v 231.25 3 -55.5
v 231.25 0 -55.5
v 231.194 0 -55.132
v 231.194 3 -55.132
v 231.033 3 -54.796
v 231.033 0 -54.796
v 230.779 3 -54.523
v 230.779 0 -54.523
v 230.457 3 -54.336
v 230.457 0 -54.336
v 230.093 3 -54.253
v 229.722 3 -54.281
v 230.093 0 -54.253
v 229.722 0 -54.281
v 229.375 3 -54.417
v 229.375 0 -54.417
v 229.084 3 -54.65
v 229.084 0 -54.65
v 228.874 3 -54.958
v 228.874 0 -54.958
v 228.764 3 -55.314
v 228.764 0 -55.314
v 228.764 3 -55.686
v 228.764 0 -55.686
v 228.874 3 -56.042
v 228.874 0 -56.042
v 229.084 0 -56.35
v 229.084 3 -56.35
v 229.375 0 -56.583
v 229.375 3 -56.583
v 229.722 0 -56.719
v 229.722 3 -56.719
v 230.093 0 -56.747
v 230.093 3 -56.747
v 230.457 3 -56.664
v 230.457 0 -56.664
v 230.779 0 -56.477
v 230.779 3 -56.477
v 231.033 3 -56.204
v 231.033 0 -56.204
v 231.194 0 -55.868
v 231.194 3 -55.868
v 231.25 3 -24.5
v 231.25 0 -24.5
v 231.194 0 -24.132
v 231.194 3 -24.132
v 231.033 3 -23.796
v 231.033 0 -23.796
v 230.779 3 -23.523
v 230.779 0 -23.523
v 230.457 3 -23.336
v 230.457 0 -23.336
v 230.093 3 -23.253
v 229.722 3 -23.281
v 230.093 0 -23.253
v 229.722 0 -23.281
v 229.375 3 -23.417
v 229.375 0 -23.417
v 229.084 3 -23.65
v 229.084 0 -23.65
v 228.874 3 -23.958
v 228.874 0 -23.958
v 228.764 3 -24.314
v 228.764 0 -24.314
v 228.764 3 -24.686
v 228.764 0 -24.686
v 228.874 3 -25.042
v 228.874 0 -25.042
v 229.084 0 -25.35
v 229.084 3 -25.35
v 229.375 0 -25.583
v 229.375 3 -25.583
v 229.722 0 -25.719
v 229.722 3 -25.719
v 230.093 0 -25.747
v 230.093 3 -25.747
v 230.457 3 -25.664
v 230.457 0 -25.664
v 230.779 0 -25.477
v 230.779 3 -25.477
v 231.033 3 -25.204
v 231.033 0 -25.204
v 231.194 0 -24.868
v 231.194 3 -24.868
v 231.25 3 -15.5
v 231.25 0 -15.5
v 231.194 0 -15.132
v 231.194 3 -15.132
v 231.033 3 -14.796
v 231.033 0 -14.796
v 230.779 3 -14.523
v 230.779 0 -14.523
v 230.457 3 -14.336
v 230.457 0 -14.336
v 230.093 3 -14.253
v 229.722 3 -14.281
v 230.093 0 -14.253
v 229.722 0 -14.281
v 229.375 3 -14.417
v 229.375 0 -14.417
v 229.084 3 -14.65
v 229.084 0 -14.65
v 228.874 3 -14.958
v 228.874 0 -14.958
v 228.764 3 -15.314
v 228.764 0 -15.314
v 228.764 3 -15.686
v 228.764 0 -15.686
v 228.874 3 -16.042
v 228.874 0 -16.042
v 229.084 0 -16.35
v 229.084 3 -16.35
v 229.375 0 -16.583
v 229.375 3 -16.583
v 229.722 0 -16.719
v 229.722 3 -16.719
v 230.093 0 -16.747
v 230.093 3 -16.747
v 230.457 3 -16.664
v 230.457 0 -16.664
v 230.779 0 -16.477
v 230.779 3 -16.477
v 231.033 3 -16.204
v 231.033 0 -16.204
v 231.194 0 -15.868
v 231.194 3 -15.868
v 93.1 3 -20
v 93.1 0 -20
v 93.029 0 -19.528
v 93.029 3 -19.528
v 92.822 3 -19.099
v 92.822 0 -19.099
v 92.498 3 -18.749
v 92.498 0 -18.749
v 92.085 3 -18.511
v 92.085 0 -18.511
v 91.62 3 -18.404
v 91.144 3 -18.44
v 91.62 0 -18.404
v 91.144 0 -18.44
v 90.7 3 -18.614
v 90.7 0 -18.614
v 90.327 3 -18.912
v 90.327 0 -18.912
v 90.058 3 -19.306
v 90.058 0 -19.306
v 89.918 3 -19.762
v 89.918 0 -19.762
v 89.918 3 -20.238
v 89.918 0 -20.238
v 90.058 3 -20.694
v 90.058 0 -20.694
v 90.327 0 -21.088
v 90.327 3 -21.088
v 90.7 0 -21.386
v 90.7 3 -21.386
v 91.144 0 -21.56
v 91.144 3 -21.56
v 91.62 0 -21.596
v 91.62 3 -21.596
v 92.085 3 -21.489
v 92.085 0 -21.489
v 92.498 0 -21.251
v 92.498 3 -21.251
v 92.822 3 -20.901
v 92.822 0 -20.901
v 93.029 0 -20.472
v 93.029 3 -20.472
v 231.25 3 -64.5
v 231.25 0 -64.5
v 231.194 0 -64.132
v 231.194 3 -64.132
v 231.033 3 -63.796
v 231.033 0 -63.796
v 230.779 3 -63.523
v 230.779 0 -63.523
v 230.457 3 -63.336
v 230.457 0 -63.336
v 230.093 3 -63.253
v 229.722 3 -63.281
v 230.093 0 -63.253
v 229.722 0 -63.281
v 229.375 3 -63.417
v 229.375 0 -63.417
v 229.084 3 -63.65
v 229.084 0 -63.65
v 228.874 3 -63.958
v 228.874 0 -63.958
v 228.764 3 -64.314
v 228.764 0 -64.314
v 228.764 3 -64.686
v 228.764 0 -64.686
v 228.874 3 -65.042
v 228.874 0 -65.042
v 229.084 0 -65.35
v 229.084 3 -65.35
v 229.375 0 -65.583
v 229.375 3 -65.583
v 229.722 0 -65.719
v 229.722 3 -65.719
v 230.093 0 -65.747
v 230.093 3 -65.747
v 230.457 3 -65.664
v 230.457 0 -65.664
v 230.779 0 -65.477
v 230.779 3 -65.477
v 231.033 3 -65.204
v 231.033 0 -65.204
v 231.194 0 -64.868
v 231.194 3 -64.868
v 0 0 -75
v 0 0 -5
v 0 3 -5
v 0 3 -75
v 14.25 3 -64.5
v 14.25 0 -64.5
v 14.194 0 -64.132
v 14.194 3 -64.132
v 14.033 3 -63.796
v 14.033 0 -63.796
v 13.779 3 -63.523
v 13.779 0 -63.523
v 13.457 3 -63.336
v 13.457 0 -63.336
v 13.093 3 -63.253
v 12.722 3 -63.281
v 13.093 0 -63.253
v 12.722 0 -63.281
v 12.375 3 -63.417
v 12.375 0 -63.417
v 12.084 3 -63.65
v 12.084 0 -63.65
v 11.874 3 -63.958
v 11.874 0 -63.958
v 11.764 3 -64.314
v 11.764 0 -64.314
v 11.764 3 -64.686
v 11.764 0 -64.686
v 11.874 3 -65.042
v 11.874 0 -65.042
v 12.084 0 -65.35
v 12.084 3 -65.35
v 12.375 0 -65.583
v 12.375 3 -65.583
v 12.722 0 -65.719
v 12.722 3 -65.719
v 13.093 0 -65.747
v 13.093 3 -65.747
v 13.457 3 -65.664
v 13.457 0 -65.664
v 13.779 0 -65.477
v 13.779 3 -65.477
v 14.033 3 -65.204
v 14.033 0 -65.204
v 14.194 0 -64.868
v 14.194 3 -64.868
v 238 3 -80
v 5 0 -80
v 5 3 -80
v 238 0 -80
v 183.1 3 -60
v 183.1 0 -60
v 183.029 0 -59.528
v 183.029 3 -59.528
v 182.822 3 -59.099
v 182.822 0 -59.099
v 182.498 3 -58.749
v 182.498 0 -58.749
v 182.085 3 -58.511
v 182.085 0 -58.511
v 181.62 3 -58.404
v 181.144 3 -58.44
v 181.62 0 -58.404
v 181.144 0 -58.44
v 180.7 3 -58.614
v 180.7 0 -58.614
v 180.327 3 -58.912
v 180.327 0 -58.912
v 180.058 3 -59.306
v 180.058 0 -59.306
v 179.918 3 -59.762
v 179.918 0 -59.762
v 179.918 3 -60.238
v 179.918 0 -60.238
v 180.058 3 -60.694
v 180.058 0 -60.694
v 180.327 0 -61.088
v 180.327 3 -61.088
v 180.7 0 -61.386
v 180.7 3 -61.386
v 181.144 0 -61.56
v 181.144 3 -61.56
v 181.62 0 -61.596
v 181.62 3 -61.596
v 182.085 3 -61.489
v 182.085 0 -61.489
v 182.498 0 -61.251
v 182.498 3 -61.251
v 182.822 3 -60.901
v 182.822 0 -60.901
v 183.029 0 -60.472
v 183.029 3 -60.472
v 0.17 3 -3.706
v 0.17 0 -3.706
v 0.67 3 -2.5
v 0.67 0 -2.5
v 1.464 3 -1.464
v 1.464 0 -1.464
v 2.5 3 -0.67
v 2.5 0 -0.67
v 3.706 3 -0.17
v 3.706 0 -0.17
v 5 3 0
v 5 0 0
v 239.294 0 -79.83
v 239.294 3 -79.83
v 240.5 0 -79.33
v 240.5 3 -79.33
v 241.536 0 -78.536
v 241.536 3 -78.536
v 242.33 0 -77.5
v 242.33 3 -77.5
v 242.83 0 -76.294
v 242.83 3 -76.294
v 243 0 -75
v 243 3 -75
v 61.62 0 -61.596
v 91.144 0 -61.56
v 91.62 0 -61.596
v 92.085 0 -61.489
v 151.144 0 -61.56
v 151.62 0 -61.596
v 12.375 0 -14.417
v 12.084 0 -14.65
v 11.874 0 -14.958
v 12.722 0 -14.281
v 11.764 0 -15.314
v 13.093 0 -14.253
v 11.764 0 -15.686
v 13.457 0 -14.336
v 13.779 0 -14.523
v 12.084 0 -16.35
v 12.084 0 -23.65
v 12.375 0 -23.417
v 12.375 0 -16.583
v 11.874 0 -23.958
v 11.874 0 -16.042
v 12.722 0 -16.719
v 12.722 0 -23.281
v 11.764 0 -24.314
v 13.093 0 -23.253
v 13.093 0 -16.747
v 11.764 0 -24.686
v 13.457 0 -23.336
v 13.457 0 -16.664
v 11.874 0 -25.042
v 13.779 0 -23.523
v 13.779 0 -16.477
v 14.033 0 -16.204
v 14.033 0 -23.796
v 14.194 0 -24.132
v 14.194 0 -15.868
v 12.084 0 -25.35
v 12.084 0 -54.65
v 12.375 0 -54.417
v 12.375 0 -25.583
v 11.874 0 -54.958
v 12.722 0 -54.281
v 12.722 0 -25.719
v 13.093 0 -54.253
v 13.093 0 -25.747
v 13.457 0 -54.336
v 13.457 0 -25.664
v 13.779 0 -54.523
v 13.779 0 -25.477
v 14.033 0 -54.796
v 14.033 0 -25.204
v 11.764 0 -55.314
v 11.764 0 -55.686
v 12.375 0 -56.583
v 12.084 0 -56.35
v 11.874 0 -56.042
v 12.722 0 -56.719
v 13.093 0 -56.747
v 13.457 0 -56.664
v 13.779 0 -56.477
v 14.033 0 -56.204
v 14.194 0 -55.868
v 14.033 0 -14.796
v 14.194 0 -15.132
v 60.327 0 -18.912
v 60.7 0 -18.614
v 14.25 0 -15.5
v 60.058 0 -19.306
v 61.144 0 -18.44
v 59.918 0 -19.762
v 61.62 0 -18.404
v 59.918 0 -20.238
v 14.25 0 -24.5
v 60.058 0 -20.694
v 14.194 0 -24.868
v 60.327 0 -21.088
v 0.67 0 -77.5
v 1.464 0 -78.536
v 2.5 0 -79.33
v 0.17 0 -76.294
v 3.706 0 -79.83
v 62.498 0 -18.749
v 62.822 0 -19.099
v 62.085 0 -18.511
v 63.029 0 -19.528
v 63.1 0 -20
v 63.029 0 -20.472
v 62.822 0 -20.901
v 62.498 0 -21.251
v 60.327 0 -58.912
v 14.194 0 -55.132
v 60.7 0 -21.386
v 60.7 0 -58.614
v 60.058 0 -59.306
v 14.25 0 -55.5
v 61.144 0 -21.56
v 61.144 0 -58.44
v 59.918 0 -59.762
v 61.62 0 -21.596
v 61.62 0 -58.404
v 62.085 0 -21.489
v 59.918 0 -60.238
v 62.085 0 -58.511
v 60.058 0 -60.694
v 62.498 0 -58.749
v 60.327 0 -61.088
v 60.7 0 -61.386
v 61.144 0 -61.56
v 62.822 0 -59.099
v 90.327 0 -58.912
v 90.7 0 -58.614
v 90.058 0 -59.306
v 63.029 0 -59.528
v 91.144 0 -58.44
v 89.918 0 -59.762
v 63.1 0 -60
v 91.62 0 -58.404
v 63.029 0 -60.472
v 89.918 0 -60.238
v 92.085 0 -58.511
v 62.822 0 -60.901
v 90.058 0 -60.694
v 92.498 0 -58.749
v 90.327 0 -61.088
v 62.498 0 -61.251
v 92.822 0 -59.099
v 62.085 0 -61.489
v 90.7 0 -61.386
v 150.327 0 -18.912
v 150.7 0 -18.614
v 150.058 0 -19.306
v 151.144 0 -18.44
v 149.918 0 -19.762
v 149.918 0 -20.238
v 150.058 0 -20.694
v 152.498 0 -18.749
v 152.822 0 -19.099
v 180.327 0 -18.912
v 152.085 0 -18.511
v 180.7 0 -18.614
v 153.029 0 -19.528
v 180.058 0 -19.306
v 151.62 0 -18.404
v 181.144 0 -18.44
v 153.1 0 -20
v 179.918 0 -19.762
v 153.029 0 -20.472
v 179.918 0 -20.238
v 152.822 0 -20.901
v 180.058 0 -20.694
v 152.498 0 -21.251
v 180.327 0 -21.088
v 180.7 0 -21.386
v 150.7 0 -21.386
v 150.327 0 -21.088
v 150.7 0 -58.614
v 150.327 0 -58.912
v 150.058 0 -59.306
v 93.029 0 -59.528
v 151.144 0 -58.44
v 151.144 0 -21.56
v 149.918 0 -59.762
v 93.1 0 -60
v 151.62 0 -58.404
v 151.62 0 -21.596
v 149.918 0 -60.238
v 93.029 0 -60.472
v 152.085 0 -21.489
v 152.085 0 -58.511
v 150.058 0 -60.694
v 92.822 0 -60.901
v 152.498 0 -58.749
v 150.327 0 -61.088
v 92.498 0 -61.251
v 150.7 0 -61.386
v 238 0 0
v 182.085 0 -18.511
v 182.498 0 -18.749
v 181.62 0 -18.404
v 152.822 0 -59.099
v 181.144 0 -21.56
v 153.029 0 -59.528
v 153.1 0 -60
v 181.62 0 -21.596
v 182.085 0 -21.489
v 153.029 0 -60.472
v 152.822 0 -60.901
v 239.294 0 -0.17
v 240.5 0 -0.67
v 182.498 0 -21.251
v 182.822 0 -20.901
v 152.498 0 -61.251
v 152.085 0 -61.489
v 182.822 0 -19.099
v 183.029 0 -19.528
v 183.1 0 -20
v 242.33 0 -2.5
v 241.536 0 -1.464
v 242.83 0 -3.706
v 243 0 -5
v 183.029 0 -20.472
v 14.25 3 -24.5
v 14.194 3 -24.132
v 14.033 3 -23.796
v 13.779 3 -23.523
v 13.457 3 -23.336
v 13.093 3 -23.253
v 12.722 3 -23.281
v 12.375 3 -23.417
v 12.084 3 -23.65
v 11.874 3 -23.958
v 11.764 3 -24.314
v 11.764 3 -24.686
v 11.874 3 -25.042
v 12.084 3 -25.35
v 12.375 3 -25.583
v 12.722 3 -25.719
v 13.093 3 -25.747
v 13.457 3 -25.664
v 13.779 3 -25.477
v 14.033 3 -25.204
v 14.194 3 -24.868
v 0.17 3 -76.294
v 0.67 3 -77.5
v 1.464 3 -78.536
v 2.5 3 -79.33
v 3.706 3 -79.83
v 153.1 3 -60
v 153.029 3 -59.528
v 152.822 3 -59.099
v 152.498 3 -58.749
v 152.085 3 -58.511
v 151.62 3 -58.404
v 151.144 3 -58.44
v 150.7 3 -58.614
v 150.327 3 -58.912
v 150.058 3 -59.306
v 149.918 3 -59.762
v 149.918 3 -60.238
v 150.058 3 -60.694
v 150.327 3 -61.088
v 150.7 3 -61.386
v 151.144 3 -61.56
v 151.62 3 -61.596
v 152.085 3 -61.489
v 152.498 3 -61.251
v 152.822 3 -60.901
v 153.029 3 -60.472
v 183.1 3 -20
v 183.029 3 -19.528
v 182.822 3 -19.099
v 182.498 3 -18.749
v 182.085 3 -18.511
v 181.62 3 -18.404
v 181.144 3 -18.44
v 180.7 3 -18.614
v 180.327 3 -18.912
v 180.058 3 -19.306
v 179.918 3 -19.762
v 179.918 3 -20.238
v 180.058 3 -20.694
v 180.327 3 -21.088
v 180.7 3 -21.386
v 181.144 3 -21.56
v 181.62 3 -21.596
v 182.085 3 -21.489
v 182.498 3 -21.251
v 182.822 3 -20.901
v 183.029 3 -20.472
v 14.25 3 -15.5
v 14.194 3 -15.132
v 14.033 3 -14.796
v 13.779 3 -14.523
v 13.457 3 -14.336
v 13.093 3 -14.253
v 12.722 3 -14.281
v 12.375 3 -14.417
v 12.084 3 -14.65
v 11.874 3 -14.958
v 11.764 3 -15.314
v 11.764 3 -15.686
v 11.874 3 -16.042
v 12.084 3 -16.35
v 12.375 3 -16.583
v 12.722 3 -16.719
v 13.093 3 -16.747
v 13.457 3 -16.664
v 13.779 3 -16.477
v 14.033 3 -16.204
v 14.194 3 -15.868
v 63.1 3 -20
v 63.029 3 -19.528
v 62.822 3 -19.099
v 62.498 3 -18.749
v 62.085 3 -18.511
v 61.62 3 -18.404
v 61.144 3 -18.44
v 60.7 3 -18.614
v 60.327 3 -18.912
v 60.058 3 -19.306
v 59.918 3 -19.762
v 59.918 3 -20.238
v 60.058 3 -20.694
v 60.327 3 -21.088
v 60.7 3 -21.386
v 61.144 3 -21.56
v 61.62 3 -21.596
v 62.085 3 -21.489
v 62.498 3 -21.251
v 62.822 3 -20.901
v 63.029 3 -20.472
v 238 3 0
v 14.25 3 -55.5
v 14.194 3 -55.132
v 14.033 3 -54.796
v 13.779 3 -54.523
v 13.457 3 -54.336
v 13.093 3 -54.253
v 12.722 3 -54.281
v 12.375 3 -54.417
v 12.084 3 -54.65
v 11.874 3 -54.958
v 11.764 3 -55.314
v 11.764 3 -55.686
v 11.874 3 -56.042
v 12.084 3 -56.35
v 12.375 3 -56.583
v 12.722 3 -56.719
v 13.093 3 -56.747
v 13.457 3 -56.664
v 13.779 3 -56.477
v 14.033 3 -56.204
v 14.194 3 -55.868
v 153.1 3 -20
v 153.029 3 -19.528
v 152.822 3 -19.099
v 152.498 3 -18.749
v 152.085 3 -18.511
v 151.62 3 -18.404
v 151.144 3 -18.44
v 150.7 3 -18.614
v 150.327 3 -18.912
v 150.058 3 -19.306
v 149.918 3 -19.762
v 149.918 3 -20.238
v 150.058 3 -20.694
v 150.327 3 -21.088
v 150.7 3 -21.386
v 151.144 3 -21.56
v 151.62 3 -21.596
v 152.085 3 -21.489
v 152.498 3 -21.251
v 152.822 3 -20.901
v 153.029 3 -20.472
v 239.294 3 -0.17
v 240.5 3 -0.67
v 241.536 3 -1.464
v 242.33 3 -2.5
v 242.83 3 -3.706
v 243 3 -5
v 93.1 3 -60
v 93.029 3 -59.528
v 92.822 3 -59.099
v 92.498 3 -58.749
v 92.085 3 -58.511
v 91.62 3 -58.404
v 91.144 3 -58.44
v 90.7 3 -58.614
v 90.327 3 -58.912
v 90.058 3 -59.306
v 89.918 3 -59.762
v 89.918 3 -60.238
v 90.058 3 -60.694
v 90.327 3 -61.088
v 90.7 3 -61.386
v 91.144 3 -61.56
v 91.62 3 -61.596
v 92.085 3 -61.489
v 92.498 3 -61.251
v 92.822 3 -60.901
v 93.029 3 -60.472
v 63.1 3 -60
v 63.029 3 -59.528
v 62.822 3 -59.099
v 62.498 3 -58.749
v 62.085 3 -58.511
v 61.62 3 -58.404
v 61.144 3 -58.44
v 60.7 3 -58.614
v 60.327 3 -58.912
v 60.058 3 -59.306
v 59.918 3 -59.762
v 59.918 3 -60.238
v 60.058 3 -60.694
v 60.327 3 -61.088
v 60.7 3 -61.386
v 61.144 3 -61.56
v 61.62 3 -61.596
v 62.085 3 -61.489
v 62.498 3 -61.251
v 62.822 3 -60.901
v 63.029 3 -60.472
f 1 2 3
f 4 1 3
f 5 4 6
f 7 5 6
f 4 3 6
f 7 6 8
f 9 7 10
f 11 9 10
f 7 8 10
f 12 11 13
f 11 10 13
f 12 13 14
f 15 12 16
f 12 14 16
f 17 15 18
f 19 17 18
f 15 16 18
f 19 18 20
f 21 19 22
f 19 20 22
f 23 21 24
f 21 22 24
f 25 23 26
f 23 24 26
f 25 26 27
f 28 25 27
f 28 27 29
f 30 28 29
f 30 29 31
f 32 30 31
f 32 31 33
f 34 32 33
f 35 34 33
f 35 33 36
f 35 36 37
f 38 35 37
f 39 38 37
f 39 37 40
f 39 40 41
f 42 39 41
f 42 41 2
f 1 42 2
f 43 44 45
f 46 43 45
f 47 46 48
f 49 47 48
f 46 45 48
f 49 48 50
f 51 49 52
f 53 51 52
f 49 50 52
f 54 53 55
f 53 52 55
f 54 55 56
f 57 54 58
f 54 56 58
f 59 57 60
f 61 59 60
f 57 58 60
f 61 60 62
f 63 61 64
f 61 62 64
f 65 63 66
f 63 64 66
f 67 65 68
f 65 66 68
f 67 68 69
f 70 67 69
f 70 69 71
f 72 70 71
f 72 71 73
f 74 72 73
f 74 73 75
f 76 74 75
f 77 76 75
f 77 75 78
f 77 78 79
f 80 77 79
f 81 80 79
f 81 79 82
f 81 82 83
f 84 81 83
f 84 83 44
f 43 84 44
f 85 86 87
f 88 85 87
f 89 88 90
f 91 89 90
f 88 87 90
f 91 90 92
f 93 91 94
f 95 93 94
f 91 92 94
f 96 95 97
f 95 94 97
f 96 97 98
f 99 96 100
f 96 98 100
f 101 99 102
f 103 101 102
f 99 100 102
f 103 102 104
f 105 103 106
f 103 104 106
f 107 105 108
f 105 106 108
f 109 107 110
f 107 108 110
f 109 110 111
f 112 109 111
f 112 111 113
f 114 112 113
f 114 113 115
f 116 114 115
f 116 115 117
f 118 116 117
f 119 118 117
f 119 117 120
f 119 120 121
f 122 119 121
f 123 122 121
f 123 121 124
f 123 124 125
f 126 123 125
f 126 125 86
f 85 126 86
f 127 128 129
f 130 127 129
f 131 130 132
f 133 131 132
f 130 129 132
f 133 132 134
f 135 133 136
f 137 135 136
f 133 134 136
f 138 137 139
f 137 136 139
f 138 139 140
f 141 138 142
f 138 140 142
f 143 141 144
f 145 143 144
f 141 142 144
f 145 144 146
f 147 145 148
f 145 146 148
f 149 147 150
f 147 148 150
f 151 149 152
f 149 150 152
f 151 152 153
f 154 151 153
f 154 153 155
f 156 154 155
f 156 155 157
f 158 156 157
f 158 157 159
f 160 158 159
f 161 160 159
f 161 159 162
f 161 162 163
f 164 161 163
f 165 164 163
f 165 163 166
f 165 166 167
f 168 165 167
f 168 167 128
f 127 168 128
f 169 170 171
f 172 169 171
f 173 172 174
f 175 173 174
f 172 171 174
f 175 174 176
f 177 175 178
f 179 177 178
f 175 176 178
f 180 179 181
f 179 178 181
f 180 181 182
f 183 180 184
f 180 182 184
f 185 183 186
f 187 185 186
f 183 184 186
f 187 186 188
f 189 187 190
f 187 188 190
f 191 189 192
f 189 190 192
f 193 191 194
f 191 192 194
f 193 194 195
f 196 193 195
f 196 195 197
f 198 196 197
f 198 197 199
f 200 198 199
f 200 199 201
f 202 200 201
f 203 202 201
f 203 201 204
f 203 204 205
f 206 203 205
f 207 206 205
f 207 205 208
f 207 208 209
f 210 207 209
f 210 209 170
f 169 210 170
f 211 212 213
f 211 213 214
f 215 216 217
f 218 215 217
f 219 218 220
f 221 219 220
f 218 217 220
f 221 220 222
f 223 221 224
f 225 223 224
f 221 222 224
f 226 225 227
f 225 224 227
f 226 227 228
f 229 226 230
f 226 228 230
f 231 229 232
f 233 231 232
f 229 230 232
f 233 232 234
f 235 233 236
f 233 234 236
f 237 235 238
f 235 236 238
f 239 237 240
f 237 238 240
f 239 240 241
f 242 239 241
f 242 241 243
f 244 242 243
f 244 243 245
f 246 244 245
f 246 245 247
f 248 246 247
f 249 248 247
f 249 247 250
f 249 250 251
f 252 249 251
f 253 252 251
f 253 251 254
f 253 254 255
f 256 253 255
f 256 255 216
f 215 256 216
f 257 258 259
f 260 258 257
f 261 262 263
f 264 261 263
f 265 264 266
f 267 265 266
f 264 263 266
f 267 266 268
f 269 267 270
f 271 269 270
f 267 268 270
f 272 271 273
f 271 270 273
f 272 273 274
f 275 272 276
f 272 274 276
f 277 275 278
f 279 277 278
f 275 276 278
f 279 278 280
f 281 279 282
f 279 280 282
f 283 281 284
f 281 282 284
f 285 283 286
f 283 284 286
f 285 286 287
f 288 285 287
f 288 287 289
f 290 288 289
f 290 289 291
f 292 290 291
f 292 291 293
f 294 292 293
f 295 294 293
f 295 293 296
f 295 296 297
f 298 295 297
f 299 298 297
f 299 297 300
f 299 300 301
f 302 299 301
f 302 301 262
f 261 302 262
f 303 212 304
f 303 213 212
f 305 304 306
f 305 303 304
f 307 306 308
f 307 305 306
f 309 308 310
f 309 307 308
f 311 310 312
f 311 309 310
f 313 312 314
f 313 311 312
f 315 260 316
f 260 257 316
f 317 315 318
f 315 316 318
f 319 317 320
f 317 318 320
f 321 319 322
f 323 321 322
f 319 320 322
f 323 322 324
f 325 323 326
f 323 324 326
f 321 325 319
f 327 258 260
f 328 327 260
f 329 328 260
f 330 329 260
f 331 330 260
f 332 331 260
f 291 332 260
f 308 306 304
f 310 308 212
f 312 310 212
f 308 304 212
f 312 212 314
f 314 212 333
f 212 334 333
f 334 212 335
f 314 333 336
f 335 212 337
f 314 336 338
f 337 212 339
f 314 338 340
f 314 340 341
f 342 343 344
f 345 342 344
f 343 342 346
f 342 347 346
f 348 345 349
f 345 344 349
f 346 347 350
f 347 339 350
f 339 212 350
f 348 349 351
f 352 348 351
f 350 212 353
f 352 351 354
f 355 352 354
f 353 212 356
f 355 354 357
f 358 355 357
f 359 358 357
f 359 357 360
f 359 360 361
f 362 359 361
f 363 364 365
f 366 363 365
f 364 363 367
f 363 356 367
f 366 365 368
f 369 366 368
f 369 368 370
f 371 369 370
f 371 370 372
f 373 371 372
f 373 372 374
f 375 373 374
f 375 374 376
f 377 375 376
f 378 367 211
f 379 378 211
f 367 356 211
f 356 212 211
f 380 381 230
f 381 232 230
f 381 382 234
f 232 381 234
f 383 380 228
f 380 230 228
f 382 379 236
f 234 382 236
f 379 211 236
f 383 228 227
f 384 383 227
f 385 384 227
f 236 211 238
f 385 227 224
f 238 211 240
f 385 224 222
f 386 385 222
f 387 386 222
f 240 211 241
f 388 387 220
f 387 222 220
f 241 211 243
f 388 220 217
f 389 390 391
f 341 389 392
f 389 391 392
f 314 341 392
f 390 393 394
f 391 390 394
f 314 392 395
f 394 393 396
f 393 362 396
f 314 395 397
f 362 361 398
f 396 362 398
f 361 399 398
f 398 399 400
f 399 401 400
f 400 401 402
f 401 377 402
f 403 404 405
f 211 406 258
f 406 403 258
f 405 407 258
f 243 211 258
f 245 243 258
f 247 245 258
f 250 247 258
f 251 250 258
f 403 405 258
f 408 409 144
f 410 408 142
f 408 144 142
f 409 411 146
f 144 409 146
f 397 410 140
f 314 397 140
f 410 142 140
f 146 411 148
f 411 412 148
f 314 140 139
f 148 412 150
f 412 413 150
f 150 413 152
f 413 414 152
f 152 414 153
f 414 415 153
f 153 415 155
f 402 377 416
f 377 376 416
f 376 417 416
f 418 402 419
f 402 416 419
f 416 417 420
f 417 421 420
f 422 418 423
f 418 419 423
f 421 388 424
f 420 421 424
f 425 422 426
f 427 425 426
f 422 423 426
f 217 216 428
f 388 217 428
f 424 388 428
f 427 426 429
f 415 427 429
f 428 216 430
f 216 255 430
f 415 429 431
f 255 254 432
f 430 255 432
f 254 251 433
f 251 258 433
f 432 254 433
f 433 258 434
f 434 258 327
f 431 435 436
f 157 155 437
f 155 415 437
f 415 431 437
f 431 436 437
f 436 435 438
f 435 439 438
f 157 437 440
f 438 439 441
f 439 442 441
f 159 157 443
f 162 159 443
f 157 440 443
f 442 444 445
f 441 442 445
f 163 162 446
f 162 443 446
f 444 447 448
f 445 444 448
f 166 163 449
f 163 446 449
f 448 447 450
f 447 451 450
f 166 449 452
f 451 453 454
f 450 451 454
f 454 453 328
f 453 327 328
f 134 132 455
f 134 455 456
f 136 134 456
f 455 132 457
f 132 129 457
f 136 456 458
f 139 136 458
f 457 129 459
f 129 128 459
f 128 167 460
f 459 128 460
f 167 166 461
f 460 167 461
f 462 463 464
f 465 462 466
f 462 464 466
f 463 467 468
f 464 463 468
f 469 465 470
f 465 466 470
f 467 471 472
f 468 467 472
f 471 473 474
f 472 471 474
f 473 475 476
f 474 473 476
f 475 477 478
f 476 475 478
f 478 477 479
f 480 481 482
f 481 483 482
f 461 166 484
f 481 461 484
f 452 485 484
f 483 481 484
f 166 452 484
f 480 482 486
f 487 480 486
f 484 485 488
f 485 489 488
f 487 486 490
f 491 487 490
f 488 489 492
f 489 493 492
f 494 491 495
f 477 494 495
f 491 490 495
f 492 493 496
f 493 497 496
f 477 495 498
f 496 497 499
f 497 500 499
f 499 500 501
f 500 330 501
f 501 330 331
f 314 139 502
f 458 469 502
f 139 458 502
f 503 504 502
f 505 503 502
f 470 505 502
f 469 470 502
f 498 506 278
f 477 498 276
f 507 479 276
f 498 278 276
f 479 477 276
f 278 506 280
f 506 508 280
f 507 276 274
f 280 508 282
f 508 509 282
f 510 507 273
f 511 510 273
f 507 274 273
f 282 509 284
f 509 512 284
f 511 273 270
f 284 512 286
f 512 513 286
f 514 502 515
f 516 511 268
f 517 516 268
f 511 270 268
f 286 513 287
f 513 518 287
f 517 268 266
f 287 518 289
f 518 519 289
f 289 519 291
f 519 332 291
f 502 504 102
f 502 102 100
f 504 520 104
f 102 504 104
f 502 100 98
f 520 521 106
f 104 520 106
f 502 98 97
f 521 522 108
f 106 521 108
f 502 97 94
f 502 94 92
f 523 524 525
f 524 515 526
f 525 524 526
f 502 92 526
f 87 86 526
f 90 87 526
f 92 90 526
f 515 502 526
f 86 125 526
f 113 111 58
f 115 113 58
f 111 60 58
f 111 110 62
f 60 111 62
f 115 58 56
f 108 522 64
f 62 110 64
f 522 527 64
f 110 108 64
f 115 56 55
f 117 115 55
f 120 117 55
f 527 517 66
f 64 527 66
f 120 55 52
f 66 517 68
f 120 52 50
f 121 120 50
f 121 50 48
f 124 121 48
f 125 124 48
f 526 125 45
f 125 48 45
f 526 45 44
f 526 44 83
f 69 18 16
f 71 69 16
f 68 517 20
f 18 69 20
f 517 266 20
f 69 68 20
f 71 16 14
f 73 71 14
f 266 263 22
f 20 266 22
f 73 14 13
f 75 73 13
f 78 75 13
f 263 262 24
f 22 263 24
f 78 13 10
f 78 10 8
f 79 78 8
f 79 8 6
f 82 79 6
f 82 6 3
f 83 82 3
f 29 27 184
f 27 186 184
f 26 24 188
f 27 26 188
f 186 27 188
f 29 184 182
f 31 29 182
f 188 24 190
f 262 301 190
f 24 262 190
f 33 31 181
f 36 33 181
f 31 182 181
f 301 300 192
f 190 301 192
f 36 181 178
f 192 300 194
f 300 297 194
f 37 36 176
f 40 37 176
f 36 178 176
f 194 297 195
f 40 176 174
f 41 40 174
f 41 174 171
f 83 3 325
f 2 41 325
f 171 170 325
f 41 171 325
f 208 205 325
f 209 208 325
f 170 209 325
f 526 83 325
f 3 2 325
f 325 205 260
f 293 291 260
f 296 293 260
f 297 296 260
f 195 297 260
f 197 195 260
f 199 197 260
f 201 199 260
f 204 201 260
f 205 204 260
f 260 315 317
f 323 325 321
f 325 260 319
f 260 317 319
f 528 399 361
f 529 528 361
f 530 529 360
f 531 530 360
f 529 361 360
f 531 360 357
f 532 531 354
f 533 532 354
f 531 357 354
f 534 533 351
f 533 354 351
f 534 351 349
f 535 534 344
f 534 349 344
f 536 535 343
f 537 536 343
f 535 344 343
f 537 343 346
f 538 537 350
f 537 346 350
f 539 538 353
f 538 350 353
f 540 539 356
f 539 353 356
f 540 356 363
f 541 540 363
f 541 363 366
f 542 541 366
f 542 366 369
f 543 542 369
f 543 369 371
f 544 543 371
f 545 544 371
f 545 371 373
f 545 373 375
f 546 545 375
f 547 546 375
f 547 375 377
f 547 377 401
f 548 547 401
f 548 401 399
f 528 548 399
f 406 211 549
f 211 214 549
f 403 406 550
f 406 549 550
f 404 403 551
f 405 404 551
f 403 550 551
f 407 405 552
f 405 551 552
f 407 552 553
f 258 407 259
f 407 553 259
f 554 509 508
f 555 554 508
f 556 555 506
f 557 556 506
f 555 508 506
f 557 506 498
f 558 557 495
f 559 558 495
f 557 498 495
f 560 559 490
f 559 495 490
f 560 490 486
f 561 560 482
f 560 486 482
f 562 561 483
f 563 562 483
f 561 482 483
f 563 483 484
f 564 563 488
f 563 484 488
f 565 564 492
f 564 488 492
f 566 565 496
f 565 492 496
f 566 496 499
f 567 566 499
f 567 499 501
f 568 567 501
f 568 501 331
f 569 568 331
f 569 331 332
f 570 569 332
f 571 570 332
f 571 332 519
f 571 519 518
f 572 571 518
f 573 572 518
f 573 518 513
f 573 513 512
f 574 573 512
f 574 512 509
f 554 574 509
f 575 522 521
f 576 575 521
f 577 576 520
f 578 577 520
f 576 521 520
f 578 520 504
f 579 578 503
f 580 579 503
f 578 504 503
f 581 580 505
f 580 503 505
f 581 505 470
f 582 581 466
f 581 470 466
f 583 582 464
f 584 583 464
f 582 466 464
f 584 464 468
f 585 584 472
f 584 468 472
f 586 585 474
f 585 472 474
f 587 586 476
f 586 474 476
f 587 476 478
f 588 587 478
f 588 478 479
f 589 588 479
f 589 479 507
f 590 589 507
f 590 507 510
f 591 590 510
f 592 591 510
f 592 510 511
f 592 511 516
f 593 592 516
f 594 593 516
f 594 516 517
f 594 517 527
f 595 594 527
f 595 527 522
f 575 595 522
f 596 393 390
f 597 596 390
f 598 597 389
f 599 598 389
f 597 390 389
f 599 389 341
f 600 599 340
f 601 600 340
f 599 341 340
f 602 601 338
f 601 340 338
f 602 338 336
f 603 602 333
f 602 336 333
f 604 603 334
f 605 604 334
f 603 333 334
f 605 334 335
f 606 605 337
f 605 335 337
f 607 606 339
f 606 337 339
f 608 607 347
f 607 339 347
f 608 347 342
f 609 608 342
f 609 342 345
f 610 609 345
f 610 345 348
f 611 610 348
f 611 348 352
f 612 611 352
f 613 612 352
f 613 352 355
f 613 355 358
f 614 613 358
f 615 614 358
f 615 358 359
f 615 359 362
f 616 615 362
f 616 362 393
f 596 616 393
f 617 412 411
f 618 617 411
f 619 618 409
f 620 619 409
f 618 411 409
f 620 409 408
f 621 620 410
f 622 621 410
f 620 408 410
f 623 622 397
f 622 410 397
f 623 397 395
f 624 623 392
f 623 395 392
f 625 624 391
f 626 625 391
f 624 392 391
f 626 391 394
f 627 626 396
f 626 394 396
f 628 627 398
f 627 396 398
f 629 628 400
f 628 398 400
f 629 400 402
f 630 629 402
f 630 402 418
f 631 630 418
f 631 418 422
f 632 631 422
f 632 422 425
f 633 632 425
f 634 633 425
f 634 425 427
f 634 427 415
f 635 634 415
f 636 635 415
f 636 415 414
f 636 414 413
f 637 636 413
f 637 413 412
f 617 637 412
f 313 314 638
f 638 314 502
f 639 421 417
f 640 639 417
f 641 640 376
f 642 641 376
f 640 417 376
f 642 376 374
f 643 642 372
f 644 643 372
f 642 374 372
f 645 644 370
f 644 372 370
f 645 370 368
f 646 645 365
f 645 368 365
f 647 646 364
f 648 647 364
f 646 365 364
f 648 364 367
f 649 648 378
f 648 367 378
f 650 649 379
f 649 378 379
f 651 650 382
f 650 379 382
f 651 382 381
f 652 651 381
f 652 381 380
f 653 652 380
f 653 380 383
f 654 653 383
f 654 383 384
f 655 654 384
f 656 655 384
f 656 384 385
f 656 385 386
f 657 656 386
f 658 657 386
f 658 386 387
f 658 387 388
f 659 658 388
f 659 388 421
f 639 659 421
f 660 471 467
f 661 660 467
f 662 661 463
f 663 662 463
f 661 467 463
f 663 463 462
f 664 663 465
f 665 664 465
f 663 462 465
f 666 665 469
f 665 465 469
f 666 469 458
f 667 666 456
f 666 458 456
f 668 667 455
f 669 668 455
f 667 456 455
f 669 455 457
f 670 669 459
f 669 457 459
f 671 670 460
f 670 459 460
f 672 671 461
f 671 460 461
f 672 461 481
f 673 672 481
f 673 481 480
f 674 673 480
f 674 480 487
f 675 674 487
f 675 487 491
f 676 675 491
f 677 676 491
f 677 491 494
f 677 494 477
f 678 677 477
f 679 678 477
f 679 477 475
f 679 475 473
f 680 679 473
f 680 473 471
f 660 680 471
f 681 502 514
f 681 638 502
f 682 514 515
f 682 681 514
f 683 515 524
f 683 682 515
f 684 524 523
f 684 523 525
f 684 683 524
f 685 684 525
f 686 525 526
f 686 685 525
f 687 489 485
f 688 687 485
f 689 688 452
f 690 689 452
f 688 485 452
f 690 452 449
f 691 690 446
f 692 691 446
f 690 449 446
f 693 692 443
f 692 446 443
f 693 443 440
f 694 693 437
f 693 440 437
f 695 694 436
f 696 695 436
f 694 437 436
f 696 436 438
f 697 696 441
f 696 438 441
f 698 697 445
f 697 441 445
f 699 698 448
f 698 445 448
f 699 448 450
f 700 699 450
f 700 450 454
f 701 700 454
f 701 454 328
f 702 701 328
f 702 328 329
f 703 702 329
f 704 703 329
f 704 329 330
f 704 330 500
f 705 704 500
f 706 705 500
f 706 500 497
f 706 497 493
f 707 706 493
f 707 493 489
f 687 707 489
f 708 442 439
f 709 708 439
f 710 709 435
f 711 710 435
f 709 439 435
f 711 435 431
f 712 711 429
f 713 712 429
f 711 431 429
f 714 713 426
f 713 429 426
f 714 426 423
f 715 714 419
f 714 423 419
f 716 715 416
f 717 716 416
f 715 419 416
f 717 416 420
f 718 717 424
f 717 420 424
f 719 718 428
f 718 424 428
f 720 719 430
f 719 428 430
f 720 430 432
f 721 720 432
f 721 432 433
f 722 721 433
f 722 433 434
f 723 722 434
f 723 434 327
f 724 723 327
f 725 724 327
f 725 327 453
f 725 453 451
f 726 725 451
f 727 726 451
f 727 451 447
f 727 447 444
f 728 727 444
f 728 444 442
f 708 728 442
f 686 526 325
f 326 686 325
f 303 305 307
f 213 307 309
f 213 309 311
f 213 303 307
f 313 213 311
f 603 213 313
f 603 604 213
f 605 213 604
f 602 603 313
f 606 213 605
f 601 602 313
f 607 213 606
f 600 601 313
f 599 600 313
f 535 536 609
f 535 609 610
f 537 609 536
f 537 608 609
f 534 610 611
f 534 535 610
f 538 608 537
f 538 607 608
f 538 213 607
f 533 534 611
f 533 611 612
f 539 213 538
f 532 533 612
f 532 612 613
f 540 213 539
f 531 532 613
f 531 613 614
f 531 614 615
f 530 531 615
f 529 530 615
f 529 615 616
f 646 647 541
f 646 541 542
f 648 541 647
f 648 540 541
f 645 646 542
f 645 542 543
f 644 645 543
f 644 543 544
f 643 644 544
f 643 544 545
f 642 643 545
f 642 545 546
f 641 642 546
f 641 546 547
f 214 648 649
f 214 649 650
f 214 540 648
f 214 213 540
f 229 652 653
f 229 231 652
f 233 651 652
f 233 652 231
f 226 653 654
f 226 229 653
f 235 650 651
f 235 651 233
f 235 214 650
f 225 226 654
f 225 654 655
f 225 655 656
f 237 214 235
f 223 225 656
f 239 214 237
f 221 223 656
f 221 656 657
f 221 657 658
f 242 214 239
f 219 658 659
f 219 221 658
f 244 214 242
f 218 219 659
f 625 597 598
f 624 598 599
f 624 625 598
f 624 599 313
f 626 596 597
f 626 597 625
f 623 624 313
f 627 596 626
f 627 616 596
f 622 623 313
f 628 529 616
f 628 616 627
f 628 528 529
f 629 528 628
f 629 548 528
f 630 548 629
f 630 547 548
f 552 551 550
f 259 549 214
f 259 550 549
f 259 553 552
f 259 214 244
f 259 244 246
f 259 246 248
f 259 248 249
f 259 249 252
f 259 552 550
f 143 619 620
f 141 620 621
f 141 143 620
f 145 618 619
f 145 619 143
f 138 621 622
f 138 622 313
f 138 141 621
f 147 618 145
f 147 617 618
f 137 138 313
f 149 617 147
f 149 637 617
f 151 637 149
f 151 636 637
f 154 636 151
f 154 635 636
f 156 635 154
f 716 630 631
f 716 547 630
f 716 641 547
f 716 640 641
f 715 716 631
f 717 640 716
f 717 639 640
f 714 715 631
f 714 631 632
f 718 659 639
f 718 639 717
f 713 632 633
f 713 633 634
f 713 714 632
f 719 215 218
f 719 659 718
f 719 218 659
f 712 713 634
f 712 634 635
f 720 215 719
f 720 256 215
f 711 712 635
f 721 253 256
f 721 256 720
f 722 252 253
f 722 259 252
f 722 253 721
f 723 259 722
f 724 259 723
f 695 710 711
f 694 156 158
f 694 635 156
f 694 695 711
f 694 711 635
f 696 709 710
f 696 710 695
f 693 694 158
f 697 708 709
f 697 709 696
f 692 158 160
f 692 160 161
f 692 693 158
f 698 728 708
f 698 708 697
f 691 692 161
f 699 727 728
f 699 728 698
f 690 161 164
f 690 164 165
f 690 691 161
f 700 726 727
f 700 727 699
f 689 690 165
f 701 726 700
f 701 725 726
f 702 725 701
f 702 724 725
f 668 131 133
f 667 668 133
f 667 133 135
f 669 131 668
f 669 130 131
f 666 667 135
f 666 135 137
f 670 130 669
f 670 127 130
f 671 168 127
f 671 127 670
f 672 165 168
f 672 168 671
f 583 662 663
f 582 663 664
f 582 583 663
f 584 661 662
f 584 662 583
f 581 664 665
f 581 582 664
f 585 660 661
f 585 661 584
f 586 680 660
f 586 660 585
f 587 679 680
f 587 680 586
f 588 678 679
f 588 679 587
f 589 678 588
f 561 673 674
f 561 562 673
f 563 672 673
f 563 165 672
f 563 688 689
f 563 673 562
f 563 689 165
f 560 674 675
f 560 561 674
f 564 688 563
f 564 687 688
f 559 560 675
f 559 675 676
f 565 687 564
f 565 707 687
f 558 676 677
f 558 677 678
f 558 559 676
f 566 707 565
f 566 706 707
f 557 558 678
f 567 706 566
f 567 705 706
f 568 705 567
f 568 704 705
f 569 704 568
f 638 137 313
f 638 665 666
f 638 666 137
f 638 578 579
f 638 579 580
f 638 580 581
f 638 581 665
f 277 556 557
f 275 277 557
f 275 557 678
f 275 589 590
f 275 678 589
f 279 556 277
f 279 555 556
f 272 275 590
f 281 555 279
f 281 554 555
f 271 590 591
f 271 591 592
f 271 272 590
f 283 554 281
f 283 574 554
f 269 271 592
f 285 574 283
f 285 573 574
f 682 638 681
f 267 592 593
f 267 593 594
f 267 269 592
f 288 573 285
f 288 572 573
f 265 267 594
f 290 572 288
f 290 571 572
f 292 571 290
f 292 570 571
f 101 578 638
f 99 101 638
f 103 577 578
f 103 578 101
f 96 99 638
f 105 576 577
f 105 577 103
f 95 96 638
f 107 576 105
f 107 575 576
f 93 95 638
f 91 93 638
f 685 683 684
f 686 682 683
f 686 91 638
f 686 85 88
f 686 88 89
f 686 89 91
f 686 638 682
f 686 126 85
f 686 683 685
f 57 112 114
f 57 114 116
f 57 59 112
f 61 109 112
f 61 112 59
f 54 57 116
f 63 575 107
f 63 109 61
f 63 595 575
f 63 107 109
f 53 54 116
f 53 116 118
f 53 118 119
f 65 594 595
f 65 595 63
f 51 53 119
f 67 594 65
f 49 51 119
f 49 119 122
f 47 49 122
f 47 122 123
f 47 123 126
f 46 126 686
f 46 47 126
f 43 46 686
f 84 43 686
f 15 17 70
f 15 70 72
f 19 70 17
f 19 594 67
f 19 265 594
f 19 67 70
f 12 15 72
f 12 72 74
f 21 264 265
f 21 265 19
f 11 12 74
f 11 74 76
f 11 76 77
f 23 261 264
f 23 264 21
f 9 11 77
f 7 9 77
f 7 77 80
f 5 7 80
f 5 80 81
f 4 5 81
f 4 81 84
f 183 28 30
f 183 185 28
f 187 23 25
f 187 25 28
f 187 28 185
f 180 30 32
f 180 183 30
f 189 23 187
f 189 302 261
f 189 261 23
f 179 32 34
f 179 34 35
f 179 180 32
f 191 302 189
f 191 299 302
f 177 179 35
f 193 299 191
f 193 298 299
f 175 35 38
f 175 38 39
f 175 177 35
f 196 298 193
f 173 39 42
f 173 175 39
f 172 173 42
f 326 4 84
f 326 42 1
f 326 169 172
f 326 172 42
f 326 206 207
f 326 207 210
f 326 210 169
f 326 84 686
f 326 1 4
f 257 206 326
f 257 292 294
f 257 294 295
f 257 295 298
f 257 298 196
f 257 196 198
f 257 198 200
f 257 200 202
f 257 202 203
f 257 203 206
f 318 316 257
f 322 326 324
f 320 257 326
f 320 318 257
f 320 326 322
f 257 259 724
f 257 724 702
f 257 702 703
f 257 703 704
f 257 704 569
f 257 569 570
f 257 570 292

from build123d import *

# Parameters (mm, degrees)
SKETCH_1_W          = 243
SKETCH_1_H          = 80
EXTRUDE_1_DEPTH     = 3
SKETCH_2_R          = 1.25
CUT_EXTRUDE_1_DEPTH = 10
FILLET_1_R          = 5
SKETCH_3_R          = 1.6
CUT_EXTRUDE_2_DEPTH = 10


with BuildPart() as part:
    # 草图1 → 凸台-拉伸1 (new body)
    with BuildSketch(Plane(origin=(0, 0, 0), x_dir=(1, 0, 0), z_dir=(0, 1, 0))):
        with Locations((121.5, 40)):
            Rectangle(SKETCH_1_W, SKETCH_1_H)
    extrude(amount=EXTRUDE_1_DEPTH)

    # 草图2 → 切除-拉伸1 (cut)
    with BuildSketch(Plane.XZ):
        with Locations((13, -64.5)):
            Circle(SKETCH_2_R)
        with Locations((13, -55.5)):
            Circle(SKETCH_2_R)
        with Locations((13, -24.5)):
            Circle(SKETCH_2_R)
        with Locations((13, -15.5)):
            Circle(SKETCH_2_R)
        with Locations((230, -55.5)):
            Circle(SKETCH_2_R)
        with Locations((230, -64.5)):
            Circle(SKETCH_2_R)
        with Locations((230, -24.5)):
            Circle(SKETCH_2_R)
        with Locations((230, -15.5)):
            Circle(SKETCH_2_R)
    extrude(amount=-CUT_EXTRUDE_1_DEPTH, mode=Mode.SUBTRACT)

    # 圆角1
    fillet_1_edges = [part.edges().sort_by_distance(p)[0] for p in [
        (0, 1.5, -80),
        (243, 1.5, -80),
        (243, 1.5, 0),
        (0, 1.5, 0),
    ]]
    fillet(fillet_1_edges, radius=FILLET_1_R)

    # 草图3 → 切除-拉伸2 (cut)
    with BuildSketch(Plane.XZ):
        with Locations((61.5, -20)):
            Circle(SKETCH_3_R)
        with Locations((91.5, -20)):
            Circle(SKETCH_3_R)
        with Locations((151.5, -20)):
            Circle(SKETCH_3_R)
        with Locations((181.5, -20)):
            Circle(SKETCH_3_R)
        with Locations((181.5, -60)):
            Circle(SKETCH_3_R)
        with Locations((151.5, -60)):
            Circle(SKETCH_3_R)
        with Locations((91.5, -60)):
            Circle(SKETCH_3_R)
        with Locations((61.5, -60)):
            Circle(SKETCH_3_R)
    extrude(amount=-CUT_EXTRUDE_2_DEPTH, mode=Mode.SUBTRACT)


solid = part.part
